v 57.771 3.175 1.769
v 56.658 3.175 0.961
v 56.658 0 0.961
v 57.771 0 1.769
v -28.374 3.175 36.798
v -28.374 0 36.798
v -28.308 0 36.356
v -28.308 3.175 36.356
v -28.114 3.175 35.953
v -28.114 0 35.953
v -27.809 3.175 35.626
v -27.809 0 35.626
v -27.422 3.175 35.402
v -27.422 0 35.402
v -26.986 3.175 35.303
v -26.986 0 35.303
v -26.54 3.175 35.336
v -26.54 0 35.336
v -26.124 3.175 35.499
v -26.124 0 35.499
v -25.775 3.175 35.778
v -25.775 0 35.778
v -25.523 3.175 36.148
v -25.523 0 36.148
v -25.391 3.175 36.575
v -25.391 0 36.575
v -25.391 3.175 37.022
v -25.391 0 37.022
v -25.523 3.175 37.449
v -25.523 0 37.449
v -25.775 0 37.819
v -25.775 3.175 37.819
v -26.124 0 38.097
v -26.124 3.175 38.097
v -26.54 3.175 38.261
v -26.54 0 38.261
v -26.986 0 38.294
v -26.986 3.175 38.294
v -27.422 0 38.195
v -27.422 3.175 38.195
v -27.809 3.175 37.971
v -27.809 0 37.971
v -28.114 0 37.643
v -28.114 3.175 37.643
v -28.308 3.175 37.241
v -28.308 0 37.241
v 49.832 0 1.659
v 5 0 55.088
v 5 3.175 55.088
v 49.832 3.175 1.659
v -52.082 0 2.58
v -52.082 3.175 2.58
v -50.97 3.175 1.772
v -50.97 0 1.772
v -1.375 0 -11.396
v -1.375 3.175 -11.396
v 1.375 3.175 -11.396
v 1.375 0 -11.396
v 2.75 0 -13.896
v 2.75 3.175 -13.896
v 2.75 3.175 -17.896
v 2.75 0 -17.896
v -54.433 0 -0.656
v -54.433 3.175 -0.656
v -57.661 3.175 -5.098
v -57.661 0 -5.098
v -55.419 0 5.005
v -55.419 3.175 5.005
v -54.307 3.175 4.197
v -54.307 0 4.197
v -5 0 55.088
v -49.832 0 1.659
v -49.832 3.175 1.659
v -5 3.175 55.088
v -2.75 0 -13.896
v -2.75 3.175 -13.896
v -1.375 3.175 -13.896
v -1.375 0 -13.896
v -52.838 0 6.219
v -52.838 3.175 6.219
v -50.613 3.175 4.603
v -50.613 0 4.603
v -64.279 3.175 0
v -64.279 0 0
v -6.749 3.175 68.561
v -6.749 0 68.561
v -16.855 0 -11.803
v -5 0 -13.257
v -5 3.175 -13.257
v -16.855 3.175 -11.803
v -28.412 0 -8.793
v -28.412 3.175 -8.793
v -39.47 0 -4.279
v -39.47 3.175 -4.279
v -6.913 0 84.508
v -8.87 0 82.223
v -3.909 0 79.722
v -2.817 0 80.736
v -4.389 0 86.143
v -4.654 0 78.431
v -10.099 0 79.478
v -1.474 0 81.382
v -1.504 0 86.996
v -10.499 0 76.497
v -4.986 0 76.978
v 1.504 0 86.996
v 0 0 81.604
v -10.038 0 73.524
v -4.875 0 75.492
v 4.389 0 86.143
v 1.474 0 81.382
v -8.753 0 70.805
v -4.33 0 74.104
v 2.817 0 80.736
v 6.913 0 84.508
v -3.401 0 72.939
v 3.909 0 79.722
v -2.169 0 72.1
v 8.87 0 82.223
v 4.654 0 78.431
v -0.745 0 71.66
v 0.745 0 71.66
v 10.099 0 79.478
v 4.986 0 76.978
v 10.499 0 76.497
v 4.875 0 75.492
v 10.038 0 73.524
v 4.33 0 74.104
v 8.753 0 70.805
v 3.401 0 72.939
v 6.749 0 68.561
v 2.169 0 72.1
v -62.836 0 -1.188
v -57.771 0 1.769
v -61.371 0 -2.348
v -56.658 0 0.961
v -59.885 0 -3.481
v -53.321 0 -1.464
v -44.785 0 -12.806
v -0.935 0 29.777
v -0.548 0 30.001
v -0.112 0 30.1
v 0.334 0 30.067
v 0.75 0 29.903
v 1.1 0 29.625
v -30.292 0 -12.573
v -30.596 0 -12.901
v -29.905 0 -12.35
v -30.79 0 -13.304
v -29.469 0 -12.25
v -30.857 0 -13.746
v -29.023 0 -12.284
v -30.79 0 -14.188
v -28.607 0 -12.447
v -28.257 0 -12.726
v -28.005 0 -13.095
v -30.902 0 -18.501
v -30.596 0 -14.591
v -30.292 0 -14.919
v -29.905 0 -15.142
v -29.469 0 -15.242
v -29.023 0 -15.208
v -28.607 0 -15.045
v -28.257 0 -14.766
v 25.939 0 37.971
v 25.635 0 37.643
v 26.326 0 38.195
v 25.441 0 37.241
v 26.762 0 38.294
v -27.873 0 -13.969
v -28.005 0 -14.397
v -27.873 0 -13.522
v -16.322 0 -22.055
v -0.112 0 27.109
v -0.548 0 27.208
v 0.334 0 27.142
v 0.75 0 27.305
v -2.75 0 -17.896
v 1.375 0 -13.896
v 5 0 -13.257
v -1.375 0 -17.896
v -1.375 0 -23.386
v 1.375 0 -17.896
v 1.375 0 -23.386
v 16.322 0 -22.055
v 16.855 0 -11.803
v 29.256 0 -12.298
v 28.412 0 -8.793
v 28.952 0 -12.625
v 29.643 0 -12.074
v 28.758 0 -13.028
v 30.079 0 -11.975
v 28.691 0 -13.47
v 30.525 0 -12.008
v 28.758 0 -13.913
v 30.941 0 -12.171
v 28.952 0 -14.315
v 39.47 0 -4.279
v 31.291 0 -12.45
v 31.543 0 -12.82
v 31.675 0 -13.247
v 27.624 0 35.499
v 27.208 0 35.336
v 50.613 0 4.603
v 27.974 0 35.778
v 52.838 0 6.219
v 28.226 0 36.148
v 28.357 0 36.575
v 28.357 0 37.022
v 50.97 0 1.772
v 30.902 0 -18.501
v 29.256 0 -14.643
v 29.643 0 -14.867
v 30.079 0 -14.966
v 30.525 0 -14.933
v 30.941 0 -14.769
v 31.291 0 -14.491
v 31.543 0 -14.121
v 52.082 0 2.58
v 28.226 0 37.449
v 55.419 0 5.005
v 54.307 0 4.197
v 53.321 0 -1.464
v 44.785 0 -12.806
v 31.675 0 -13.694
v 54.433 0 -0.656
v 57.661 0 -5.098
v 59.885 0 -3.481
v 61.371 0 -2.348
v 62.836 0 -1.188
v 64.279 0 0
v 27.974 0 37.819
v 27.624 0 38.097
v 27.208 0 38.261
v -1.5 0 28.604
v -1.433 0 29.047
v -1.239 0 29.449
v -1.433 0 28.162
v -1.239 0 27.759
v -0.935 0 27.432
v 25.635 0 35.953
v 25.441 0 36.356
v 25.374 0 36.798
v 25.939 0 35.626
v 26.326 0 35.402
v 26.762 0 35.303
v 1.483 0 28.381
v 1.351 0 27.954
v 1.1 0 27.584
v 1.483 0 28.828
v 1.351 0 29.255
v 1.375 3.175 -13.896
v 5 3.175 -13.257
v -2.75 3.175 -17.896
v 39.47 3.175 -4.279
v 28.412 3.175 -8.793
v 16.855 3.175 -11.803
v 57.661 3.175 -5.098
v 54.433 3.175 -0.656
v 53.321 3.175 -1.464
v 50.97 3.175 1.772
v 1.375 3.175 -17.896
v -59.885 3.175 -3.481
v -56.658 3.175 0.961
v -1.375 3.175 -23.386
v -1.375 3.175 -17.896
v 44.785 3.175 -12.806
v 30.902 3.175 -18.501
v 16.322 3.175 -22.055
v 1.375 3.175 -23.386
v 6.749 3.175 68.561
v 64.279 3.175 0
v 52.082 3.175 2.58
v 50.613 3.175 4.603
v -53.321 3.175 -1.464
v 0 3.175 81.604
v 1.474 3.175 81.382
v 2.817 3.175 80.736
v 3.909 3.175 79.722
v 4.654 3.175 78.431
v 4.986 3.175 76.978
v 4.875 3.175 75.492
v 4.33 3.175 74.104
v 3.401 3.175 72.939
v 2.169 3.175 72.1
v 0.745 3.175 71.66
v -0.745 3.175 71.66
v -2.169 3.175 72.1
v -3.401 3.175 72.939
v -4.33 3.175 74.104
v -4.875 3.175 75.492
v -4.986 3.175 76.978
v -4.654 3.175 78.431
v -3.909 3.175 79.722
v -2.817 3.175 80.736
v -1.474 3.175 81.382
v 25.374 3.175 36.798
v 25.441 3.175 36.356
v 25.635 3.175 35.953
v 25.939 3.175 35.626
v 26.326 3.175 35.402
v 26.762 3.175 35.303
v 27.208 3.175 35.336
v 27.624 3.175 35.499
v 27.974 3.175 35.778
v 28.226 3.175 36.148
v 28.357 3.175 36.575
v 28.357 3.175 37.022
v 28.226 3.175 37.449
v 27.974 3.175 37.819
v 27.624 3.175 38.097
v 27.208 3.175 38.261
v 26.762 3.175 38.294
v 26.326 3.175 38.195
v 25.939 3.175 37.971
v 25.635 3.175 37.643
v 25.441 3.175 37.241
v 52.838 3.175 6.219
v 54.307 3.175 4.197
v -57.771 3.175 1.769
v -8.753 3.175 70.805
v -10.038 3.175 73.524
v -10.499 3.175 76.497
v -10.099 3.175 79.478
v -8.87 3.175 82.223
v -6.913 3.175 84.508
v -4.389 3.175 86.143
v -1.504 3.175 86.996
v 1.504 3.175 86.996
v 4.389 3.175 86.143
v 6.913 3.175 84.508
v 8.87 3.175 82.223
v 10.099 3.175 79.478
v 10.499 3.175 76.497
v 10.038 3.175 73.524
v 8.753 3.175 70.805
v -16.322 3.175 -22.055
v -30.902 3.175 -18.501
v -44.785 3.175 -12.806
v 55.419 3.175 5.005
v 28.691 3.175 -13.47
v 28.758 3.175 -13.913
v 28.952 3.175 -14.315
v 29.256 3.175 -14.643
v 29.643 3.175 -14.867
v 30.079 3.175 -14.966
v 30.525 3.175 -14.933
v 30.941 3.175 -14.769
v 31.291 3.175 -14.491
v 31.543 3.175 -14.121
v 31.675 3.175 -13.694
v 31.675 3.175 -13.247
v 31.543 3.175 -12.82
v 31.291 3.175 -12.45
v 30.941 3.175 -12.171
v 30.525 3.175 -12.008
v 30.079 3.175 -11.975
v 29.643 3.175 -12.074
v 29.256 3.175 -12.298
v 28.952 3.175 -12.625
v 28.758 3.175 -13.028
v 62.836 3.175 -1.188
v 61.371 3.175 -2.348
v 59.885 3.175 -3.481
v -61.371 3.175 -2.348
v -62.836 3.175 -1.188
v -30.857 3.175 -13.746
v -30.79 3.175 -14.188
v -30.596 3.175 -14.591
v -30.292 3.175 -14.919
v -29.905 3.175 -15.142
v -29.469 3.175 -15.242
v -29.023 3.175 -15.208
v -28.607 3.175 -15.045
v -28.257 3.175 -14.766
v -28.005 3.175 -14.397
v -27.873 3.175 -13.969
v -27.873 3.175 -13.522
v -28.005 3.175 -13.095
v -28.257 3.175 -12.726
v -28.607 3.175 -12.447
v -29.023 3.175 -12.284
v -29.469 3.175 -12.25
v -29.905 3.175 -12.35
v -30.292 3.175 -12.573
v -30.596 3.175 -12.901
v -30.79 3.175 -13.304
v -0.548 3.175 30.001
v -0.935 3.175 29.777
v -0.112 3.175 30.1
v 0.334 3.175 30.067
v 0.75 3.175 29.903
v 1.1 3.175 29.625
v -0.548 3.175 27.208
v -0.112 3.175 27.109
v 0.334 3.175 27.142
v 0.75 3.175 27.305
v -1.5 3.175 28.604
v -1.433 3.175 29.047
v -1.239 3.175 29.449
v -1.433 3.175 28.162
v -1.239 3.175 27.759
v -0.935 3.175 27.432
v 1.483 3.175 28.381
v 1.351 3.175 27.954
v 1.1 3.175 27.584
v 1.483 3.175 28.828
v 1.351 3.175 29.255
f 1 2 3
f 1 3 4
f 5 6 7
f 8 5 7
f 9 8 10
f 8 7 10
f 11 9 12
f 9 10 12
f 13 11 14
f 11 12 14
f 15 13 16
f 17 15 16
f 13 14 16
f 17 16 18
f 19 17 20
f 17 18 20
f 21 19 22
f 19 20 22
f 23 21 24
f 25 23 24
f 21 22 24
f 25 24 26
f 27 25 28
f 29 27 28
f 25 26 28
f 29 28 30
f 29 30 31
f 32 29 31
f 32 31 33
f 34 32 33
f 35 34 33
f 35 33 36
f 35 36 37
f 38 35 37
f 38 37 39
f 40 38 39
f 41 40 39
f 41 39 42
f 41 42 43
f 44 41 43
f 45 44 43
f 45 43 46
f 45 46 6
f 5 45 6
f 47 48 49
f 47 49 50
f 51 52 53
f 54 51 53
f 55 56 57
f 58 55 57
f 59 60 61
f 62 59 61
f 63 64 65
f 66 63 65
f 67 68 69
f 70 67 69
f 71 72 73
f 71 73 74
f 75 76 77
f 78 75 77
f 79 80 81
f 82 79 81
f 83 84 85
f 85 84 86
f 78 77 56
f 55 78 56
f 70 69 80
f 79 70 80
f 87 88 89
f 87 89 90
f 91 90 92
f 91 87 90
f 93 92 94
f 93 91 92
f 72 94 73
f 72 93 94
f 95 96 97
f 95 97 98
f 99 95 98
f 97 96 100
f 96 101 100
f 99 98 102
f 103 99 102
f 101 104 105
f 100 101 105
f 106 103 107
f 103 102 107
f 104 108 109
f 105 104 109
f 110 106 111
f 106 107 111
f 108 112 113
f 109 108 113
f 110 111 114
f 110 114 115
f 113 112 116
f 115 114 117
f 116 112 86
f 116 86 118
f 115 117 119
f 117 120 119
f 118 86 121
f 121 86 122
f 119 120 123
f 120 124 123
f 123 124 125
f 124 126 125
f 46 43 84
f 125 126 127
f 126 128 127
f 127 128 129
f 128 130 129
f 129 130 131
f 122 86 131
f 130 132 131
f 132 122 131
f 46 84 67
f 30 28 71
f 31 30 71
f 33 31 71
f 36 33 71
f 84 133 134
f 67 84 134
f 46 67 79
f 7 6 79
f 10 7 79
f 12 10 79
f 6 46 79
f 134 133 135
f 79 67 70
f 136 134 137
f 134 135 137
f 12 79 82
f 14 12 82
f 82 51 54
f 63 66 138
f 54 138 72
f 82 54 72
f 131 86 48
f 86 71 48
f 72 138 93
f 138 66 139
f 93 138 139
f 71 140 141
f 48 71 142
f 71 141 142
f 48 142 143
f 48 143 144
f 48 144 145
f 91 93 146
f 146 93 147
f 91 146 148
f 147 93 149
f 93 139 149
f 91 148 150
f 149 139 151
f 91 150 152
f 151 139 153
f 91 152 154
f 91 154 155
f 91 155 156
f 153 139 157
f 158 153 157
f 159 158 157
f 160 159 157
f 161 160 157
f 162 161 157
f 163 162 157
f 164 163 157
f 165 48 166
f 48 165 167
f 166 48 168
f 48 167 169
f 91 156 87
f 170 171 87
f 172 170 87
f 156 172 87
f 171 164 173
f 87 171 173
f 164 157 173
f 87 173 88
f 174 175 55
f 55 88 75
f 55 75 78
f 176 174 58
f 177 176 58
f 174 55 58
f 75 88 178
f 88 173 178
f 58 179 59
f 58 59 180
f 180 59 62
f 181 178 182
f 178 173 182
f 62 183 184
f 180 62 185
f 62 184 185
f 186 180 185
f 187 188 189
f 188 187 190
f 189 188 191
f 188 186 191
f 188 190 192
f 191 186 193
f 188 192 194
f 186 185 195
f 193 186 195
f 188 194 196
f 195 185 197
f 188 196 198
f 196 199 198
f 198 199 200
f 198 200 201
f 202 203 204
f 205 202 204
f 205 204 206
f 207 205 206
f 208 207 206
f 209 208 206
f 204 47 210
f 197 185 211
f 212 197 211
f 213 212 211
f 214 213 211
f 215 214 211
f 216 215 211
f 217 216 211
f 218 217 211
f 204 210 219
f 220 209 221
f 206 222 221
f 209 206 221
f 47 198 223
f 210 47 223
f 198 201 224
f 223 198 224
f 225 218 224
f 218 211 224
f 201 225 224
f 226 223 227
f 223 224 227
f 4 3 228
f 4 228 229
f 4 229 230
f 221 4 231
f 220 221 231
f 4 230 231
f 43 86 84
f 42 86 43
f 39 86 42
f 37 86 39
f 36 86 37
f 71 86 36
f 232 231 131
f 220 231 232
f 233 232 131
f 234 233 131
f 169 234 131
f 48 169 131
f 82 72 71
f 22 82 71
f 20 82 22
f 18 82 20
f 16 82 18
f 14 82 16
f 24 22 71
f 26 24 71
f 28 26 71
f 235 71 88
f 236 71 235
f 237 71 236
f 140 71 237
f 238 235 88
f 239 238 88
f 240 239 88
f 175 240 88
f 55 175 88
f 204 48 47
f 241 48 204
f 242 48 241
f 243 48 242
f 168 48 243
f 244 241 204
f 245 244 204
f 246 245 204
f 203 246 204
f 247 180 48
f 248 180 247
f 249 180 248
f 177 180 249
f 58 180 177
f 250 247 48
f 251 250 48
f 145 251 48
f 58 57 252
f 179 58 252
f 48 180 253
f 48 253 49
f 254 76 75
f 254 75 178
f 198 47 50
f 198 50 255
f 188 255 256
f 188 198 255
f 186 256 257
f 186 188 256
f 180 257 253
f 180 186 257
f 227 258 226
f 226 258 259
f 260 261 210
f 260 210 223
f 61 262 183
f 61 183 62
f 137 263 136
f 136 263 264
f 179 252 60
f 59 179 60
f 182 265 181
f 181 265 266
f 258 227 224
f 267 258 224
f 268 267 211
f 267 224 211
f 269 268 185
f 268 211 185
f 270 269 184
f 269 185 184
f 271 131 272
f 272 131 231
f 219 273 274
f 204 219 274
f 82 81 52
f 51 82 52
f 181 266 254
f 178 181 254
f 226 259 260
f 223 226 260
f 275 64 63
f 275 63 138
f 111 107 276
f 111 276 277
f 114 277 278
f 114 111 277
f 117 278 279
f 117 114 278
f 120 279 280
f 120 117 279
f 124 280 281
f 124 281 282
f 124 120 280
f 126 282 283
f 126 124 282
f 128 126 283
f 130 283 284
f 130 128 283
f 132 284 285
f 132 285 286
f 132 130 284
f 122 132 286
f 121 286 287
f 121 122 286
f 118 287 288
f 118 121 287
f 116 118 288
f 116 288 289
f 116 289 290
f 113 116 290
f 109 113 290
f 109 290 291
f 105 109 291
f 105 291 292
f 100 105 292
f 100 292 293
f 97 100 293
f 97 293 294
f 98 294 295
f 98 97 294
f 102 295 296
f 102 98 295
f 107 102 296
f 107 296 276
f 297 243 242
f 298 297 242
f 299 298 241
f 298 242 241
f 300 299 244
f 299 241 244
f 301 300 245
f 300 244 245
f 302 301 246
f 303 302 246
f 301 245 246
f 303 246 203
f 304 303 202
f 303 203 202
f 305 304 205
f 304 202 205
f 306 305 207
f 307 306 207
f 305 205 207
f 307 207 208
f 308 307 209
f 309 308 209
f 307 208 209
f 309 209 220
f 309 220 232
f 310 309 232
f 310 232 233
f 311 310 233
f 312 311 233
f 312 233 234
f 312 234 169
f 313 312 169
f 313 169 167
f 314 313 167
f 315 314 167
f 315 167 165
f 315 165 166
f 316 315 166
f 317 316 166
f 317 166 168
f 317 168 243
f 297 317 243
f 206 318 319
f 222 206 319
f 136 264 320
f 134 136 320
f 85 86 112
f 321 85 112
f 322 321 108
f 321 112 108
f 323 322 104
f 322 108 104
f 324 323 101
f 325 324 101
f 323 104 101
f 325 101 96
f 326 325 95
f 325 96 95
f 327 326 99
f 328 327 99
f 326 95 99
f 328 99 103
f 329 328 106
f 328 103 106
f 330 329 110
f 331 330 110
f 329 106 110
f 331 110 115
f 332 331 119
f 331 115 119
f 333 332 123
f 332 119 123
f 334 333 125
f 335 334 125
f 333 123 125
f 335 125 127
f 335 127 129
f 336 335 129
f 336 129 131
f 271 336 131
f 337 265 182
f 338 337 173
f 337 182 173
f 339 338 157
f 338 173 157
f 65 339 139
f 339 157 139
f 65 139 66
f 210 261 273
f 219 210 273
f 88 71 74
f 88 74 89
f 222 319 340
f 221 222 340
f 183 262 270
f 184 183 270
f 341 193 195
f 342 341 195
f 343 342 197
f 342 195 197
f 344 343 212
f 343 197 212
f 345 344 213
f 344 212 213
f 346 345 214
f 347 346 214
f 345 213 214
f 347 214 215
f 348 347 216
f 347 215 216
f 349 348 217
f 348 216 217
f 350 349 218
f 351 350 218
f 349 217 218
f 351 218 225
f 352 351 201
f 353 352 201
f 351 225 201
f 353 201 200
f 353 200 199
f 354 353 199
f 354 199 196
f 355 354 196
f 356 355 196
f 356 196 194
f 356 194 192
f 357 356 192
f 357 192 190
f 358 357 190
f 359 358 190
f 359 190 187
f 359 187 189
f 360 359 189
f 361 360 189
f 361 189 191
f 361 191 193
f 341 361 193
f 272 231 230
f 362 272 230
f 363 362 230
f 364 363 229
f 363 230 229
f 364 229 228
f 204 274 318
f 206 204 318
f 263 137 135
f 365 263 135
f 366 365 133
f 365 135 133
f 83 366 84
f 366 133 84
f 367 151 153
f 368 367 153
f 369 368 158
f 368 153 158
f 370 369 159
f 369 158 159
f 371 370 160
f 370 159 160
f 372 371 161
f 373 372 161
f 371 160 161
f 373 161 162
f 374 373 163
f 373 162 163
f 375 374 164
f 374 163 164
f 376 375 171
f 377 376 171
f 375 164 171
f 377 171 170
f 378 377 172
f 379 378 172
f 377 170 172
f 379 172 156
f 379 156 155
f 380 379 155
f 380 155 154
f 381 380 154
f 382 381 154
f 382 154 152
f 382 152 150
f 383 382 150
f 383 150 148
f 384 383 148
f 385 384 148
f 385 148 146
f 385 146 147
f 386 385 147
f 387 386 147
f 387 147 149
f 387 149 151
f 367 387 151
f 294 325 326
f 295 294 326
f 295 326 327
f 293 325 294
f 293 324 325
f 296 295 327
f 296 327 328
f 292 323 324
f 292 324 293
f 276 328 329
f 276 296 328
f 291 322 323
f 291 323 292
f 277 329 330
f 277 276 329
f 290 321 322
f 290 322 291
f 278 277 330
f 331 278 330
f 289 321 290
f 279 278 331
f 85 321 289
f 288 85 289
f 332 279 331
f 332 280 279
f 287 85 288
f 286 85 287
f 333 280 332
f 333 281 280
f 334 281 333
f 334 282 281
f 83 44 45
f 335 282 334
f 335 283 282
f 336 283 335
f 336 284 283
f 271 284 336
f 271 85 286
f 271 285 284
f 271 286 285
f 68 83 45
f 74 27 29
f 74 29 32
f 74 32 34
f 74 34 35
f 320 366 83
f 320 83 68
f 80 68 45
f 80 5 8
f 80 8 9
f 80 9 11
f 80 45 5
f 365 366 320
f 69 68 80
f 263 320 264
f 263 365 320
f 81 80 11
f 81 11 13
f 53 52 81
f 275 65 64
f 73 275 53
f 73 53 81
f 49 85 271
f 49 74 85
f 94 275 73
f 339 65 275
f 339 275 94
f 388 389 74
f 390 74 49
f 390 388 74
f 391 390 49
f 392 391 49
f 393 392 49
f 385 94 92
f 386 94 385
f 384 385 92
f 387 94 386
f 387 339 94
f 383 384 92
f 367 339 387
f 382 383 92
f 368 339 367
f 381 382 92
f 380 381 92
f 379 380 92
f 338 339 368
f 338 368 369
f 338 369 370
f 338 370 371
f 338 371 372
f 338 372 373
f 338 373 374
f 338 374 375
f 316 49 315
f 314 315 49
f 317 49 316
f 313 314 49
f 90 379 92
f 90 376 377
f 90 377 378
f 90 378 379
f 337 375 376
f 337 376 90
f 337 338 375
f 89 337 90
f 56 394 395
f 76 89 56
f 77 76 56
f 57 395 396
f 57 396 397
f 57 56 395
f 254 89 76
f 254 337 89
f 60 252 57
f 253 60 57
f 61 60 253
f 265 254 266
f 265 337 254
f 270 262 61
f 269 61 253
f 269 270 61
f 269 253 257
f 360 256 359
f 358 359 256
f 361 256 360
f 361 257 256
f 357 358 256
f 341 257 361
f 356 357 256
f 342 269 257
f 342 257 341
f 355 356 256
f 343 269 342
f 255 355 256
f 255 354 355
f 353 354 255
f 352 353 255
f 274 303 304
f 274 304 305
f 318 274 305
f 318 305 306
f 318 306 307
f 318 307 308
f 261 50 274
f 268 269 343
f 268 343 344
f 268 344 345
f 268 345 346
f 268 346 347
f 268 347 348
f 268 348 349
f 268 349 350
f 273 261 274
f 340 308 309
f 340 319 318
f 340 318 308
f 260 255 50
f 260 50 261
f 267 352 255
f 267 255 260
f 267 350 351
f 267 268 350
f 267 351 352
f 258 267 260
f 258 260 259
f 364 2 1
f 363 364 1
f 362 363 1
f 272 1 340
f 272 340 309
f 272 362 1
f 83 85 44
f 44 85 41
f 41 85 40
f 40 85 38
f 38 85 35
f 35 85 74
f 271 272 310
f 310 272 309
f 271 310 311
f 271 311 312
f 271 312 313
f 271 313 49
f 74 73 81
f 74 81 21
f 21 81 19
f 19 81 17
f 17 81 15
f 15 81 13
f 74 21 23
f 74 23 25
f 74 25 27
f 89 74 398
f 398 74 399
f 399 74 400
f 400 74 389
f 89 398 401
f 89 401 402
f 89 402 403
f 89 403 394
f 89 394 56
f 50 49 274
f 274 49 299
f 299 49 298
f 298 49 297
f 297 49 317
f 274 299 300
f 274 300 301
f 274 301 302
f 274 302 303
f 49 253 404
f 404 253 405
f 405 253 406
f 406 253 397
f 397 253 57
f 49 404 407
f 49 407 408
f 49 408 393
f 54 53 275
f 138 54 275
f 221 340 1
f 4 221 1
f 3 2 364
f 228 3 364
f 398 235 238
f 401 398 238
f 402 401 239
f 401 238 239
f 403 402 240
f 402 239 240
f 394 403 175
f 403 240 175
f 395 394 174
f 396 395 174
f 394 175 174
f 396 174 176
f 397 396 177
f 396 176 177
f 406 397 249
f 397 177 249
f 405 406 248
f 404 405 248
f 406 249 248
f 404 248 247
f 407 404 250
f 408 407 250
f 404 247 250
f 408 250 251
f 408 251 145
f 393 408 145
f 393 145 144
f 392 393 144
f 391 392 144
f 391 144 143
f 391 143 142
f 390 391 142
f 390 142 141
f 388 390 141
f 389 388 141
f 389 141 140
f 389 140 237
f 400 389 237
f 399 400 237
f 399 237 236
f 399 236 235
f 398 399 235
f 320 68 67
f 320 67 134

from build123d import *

# Parameters (mm, degrees)
SKETCH1_R                       = 5
BOSS_EXTRUDE1_DEPTH             = 3.175
SKETCH6_W                       = 2.75
SKETCH6_H                       = 2.5
SKETCH6_H_2                     = 4
SKETCH6_W_2                     = 1.375
CUT_EXTRUDE4_DEPTH              = 109.300618445
CIRPATTERN1_COUNT               = 2
CIRPATTERN1_ANGLE               = 36
CIRPATTERN1_THE_OTHER_WAY_COUNT = 2
CIRPATTERN1_THE_OTHER_WAY_ANGLE = 36
F_3_0_3_DIAMETER_HOLE1_D        = 3


with BuildPart() as part:
    # Sketch1 → Boss-Extrude1 (new body)
    with BuildSketch(Plane(origin=(0, 0, 0), x_dir=(1, 0, 0), z_dir=(0, 1, 0))):
        with BuildLine():
            Line((-64.278760969, 0), (-6.749269902, -68.560977659))
            ThreePointArc((-6.749269902, -68.560977659), (0, -87.104444312), (6.749269902, -68.560977659))
            Line((6.749269902, -68.560977659), (64.278760969, 0))
            ThreePointArc((64.278760969, 0), (0, 23.395555688), (-64.278760969, 0))
        make_face()
        with Locations(Location((0, -76.604444312, 0), (0, 0, 270))):
            Circle(SKETCH1_R, mode=Mode.SUBTRACT)
        with BuildLine():
            Line((-49.832227183, -1.659470271), (-5, -55.08843808))
            Line((-5, -55.08843808), (-5, 13.256559466))
            ThreePointArc((-5, 13.256559466), (-28.412414016, 8.793065779), (-49.832227183, -1.659470271))
        make_face(mode=Mode.SUBTRACT)
        with BuildLine():
            Line((5, -55.08843808), (49.832227183, -1.659470271))
            ThreePointArc((49.832227183, -1.659470271), (28.412414016, 8.793065779), (5, 13.256559466))
            Line((5, 13.256559466), (5, -55.08843808))
        make_face(mode=Mode.SUBTRACT)
    extrude(amount=BOSS_EXTRUDE1_DEPTH)

    # Sketch6 → Cut-Extrude4 (cut, through all)
    with BuildSketch(Plane(origin=(0, 3.175, 0), x_dir=(1, 0, 0), z_dir=(0, 1, 0))):
        with Locations((0, 12.645555688)):
            Rectangle(SKETCH6_W, SKETCH6_H)
        with Locations((0, 15.895555688)):
            Rectangle(SKETCH6_W, SKETCH6_H_2)
        with Locations((-2.0625, 15.895555688)):
            Rectangle(SKETCH6_W_2, SKETCH6_H_2)
        with BuildLine():
            Line((-1.375, 23.386102116), (-1.375, 17.895555688))
            Line((-1.375, 17.895555688), (1.375, 17.895555688))
            Line((1.375, 17.895555688), (1.375, 23.386102116))
            ThreePointArc((1.375, 23.386102116), (0.687516249, 23.393192267), (0, 23.395555688))
            ThreePointArc((0, 23.395555688), (-0.687516249, 23.393192267), (-1.375, 23.386102116))
        make_face()
        with Locations((2.0625, 15.895555688)):
            Rectangle(SKETCH6_W_2, SKETCH6_H_2)
    cut_extrude4 = extrude(amount=-CUT_EXTRUDE4_DEPTH, mode=Mode.SUBTRACT)

    # CirPattern1: Cut-Extrude4 ×2 about axis
    cirpattern1_axis = Axis((0, 0, 76.604444312), (0, -1, 0))
    for i in range(1, CIRPATTERN1_COUNT):
        add(cut_extrude4.rotate(cirpattern1_axis, i * CIRPATTERN1_ANGLE / (CIRPATTERN1_COUNT - 1)), mode=Mode.SUBTRACT)

    # CirPattern1 the other way: Cut-Extrude4 ×2 about axis
    cirpattern1_the_other_way_axis = Axis((0, 0, 76.604444312), (0, 1, 0))
    for i in range(1, CIRPATTERN1_THE_OTHER_WAY_COUNT):
        add(cut_extrude4.rotate(cirpattern1_the_other_way_axis, i * CIRPATTERN1_THE_OTHER_WAY_ANGLE / (CIRPATTERN1_THE_OTHER_WAY_COUNT - 1)), mode=Mode.SUBTRACT)

    # Ø3.0 (3) Diameter Hole1 (through all)
    with Locations(Plane(origin=(0, 3.175, 0), x_dir=(1, 0, 0), z_dir=(0, 1, 0))):
        with Locations((0, -28.604444312), (-26.874184456, -36.798419304), (26.874184456, -36.798419304), (30.19139013, 13.470413235), (-29.356614466, 13.745924736)):
            Hole(F_3_0_3_DIAMETER_HOLE1_D / 2)


solid = part.part
